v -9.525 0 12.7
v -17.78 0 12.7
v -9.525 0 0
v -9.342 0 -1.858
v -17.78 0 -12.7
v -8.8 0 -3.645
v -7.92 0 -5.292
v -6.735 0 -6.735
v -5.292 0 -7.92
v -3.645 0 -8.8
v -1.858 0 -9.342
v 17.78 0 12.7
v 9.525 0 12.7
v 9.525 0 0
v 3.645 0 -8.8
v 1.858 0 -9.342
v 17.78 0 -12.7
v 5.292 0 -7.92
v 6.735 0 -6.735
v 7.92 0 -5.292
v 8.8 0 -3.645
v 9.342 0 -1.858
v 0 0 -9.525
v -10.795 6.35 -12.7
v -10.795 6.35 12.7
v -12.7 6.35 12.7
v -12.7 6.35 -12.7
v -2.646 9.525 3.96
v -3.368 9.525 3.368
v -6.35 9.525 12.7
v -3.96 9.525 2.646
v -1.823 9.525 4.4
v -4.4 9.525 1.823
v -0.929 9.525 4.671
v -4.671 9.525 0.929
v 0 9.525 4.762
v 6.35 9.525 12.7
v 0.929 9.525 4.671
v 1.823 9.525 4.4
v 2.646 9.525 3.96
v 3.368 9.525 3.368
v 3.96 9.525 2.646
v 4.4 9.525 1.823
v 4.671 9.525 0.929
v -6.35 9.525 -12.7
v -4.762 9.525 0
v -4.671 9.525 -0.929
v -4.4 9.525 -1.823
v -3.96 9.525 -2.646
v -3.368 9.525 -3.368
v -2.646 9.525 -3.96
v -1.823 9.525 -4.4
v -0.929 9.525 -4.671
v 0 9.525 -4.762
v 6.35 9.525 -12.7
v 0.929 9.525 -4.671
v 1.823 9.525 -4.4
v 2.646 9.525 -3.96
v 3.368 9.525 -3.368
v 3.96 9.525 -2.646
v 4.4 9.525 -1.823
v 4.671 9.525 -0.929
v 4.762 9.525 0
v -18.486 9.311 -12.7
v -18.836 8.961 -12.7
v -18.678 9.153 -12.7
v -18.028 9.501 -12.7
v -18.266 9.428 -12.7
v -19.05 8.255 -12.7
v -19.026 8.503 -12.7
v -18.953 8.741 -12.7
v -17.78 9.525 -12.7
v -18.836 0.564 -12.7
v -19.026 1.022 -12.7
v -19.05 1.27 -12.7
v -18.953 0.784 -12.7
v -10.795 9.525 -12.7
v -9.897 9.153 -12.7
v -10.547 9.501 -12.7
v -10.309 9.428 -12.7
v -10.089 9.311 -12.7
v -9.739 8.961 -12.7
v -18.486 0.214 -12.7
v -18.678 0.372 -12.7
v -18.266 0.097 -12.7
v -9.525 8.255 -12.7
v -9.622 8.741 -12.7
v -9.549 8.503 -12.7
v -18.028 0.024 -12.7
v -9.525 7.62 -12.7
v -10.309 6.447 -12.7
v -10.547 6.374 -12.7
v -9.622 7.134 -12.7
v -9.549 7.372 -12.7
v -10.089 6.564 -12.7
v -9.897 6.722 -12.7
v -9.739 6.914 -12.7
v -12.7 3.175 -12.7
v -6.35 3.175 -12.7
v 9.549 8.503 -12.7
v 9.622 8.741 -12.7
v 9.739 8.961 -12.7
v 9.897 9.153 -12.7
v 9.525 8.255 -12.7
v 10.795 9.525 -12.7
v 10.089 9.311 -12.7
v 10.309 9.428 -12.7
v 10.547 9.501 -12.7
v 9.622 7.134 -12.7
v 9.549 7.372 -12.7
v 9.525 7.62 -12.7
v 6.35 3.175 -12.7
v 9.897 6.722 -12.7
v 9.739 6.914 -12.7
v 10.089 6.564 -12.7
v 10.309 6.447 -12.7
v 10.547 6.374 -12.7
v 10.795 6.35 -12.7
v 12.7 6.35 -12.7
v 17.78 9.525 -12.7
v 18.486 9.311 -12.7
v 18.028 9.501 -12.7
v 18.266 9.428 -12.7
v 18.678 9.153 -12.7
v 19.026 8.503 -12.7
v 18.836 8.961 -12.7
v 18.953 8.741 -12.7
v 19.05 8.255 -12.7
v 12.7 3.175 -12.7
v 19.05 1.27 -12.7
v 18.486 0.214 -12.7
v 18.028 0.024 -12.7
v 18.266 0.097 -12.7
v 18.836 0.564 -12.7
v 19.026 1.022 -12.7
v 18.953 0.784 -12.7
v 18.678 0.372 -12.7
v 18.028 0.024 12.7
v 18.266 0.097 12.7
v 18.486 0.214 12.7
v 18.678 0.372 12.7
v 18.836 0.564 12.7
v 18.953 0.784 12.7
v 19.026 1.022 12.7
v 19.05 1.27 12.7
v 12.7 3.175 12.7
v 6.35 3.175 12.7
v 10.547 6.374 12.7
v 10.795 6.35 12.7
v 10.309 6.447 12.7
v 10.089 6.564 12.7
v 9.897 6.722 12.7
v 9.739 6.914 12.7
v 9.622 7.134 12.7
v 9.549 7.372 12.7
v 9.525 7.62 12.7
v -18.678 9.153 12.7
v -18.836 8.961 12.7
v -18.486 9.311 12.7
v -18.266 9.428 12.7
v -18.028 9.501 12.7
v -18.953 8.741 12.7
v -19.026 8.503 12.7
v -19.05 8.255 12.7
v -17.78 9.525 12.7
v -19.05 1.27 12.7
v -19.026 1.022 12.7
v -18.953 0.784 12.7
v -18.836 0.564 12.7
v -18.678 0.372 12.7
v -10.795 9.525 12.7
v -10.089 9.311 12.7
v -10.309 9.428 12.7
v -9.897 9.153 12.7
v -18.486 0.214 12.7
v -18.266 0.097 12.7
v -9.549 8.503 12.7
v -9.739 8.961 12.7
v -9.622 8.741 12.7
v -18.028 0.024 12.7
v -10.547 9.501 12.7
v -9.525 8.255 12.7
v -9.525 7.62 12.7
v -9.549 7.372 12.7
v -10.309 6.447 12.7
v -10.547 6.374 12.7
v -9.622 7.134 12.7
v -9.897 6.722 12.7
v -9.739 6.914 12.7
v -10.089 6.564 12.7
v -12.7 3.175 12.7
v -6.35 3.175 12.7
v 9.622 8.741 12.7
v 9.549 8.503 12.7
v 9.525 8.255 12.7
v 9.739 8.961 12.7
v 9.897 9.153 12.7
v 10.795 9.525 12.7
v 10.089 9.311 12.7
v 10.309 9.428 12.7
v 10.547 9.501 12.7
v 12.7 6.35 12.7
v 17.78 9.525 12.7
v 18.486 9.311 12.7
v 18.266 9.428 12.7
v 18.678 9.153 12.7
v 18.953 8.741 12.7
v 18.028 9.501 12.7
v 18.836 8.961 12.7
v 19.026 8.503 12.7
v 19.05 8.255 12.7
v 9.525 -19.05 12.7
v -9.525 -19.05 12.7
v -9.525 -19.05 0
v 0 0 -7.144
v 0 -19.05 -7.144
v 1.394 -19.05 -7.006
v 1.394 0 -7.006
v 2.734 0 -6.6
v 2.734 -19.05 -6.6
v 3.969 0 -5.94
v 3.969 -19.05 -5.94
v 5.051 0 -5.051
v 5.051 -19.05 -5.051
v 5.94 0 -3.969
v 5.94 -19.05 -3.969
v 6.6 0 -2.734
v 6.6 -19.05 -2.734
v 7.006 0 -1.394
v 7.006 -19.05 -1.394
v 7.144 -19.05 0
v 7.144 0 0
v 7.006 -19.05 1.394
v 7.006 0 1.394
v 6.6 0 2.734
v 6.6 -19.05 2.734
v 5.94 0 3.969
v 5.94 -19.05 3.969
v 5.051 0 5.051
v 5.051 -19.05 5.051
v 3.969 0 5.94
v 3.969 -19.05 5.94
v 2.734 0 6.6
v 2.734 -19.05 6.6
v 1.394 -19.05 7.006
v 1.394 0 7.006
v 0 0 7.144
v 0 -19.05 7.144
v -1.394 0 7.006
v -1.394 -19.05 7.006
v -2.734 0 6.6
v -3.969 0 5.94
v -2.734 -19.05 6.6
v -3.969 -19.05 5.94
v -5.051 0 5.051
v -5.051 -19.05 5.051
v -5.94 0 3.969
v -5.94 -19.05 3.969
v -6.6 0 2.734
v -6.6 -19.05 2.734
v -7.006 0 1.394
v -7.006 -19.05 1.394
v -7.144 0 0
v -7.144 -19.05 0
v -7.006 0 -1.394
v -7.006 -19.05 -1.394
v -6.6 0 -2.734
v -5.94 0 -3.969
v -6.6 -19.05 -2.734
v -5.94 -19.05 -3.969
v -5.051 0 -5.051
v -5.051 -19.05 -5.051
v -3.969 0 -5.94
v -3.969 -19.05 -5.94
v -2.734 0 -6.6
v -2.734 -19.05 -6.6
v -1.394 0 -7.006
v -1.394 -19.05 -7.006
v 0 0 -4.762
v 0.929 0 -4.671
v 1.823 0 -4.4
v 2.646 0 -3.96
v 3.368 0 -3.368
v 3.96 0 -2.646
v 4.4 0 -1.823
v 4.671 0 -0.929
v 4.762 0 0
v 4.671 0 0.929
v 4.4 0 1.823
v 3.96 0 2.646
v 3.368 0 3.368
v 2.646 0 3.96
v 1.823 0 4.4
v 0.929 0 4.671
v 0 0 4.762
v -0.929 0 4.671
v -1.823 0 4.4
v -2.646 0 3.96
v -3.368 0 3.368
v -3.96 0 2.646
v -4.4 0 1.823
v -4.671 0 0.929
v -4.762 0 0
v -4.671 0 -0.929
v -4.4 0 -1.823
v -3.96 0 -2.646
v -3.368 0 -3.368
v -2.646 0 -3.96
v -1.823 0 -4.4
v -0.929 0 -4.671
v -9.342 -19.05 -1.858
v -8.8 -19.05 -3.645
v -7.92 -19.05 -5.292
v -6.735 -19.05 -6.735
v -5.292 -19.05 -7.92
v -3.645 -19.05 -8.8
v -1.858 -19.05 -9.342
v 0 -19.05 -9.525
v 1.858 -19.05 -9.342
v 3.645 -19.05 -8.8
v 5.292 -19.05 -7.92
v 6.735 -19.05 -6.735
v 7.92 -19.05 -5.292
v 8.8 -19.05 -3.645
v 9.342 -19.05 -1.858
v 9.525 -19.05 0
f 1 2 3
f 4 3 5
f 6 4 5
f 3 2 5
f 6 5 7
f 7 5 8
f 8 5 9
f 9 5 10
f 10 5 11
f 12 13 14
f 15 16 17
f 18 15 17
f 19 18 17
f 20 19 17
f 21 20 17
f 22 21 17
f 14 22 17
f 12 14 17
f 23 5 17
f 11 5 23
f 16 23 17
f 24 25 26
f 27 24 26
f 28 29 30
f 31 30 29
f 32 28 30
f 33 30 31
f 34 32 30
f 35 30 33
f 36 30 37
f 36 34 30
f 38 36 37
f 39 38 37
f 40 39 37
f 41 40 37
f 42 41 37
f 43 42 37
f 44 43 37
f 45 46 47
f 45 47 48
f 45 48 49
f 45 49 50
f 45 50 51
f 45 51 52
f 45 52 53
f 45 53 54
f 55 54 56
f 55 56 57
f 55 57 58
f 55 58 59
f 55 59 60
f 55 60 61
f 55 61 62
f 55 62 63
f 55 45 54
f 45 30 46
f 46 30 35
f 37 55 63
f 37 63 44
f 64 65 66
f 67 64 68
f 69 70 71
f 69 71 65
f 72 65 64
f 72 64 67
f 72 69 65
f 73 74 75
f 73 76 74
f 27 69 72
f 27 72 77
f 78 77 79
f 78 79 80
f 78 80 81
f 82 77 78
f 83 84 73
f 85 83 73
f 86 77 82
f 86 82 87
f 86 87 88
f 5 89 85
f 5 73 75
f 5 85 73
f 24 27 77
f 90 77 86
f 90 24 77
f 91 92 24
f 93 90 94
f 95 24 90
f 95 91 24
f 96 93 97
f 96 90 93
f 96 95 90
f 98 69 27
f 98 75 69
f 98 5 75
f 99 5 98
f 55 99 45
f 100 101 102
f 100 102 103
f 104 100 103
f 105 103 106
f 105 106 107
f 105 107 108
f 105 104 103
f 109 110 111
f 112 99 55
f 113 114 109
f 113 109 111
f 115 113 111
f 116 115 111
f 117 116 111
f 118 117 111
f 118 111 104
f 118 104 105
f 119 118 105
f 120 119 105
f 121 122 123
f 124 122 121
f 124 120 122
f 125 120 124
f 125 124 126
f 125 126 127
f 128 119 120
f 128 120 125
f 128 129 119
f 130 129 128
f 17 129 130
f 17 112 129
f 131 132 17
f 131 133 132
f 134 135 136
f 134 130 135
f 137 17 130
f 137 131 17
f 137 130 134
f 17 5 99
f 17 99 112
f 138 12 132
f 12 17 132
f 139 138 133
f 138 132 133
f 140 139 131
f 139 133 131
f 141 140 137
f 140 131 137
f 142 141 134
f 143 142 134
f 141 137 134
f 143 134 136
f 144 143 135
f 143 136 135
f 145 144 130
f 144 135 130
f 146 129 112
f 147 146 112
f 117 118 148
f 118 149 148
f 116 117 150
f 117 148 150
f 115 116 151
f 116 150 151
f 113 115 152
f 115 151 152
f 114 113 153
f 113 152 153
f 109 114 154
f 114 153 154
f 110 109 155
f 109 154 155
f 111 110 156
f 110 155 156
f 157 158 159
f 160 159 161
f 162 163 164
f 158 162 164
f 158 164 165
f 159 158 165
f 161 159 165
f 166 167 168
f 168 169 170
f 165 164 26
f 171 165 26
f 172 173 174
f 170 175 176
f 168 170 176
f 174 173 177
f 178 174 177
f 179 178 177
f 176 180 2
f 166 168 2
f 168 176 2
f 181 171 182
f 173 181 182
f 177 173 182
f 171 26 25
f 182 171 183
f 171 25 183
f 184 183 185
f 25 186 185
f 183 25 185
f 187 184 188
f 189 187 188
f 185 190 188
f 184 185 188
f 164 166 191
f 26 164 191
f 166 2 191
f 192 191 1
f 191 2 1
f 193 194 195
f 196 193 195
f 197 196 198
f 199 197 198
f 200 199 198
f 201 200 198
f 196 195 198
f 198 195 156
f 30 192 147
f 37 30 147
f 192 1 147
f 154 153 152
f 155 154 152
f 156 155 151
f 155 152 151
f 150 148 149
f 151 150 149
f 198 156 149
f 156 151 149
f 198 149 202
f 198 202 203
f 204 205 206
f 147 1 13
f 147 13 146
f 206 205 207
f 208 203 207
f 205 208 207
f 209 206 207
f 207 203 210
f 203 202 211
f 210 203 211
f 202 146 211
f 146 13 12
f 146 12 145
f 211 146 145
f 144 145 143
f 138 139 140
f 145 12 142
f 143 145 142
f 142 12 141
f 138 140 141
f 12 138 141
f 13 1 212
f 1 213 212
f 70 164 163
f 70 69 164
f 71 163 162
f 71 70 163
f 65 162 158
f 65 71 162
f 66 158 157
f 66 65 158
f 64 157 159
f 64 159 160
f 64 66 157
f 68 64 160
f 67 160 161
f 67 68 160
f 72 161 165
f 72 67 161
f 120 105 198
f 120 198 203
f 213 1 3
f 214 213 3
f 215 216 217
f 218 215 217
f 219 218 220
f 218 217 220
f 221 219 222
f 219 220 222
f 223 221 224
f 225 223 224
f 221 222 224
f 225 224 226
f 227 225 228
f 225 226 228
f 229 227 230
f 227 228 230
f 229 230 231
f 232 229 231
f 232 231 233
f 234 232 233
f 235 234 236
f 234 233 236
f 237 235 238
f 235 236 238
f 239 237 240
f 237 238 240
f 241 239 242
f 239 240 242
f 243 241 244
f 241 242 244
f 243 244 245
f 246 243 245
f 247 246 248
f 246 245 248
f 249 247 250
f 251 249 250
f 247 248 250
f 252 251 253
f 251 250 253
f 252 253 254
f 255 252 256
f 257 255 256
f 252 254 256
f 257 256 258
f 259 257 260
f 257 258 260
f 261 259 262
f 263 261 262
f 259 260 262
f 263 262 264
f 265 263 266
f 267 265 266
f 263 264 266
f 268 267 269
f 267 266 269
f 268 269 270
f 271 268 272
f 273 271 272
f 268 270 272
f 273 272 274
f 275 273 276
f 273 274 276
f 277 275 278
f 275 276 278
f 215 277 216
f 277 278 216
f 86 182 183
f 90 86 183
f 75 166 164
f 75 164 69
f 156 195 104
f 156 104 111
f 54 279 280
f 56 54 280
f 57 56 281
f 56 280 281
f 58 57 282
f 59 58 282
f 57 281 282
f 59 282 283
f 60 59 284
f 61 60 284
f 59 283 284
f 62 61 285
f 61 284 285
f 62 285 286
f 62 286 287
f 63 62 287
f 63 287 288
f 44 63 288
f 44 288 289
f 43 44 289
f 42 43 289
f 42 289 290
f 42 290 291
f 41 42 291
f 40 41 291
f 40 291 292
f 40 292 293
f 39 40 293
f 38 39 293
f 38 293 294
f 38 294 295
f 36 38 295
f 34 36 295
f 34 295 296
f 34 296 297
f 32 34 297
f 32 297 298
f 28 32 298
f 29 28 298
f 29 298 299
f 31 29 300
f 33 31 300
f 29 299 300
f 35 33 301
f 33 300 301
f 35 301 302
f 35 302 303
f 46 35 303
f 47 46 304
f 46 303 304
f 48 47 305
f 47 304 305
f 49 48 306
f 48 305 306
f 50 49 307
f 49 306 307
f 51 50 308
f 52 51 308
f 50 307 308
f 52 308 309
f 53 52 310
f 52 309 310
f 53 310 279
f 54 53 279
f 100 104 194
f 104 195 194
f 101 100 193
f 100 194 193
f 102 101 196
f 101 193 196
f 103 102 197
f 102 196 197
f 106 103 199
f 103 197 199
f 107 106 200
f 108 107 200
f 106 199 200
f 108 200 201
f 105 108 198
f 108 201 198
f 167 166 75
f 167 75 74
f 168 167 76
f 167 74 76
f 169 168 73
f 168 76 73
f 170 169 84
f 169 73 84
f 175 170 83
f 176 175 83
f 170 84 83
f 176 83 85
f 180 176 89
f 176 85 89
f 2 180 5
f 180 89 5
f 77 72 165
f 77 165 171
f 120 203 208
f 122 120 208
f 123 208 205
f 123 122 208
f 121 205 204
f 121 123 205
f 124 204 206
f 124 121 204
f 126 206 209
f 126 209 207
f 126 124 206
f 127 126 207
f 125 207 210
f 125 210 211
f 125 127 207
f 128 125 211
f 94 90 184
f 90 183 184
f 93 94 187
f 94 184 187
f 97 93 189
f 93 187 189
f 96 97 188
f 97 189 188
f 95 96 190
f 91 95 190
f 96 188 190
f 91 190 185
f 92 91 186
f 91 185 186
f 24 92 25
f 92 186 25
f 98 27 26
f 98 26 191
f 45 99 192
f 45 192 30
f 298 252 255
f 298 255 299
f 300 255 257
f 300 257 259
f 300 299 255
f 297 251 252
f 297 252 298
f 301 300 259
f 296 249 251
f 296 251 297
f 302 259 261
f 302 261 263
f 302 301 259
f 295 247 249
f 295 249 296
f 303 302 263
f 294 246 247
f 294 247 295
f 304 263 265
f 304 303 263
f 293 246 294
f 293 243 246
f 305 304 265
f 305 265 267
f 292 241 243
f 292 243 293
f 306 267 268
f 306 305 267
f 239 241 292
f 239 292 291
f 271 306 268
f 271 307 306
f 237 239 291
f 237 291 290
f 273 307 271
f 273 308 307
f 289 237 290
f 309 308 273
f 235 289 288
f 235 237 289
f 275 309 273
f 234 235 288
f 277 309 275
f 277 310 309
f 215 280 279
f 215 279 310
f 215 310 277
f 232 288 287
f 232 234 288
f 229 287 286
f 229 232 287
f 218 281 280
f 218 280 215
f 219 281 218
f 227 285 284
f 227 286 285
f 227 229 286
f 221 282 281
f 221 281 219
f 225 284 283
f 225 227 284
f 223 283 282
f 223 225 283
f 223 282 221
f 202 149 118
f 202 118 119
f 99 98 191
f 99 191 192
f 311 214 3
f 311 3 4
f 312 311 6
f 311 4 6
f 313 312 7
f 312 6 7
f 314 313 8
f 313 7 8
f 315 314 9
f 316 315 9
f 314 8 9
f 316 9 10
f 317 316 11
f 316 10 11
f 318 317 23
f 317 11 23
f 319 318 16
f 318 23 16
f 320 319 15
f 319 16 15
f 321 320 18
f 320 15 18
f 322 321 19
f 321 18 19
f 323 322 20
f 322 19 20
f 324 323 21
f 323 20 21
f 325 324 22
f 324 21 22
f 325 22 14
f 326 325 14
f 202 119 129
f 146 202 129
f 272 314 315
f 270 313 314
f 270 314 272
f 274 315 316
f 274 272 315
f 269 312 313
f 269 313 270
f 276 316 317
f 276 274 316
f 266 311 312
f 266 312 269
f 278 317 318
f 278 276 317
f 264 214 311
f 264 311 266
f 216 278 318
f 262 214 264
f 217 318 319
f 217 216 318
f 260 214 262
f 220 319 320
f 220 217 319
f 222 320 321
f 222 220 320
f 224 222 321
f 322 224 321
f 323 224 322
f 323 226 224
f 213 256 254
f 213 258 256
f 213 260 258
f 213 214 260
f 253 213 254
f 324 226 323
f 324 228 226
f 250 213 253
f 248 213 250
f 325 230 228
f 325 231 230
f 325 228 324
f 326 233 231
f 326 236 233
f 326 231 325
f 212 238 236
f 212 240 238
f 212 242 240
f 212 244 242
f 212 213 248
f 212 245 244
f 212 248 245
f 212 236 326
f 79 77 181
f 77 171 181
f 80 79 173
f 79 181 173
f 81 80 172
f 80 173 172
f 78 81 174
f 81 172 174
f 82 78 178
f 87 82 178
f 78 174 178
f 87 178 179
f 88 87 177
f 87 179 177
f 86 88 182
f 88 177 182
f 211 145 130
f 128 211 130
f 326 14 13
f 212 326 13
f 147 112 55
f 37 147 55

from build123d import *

# Parameters (mm, degrees)
SKETCH1_W           = 38.1
SKETCH1_H           = 25.4
BOSS_EXTRUDE1_DEPTH = 9.525
CUT_EXTRUDE1_REACH  = 35.148
BOSS_EXTRUDE2_DEPTH = 19.05
CUT_EXTRUDE3_REACH  = 38.616
SKETCH5_R           = 4.7625
SKETCH4_R           = 7.14375
CUT_EXTRUDE2_DEPTH  = 19.05
FILLET2_R           = 1.27


with BuildPart() as part:
    # Sketch1 → Boss-Extrude1 (new body)
    with BuildSketch(Plane(origin=(0, 0, 0), x_dir=(1, 0, 0), z_dir=(0, 1, 0))):
        Rectangle(SKETCH1_W, SKETCH1_H)
    extrude(amount=BOSS_EXTRUDE1_DEPTH)

    # Sketch2 → Cut-Extrude1 (cut, up to next)
    with BuildSketch(Plane(origin=(0, 0, -12.7), x_dir=(-1, 0, 0), z_dir=(0, 0, -1)), mode=Mode.PRIVATE) as cut_extrude1_sk1:
        Polygon((-9.525, 9.525), (-9.525, 6.35), (-12.7, 6.35), (-12.7, 3.175), (-6.35, 3.175), (-6.35, 9.525), align=None)
    cut_extrude1_tool1 = extrude(cut_extrude1_sk1.sketch, amount=-CUT_EXTRUDE1_REACH, mode=Mode.PRIVATE) & part.part
    cut_extrude1 = cut_extrude1_tool1.solids().sort_by_distance((8.995833, 5.820833, -12.7))[0]
    add(cut_extrude1, mode=Mode.SUBTRACT)

    # Mirror1: Cut-Extrude1 across plane
    add(cut_extrude1.mirror(Plane(origin=(0, 0, 0), x_dir=(0, 0, 1), z_dir=(1, 0, 0))), mode=Mode.SUBTRACT)

    # Sketch3 → Boss-Extrude2 (add)
    with BuildSketch(Plane.XZ):
        with BuildLine():
            Line((9.525, 0), (9.525, 12.7))
            Line((9.525, 12.7), (-9.525, 12.7))
            Line((-9.525, 12.7), (-9.525, 0))
            ThreePointArc((-9.525, 0), (0, -9.525), (9.525, 0))
        make_face()
    extrude(amount=BOSS_EXTRUDE2_DEPTH)

    # Sketch5 → Cut-Extrude3 (cut, up to next)
    with BuildSketch(Plane(origin=(0, -19.05, 0), x_dir=(-1, 0, 0), z_dir=(0, -1, 0)), mode=Mode.PRIVATE) as cut_extrude3_sk1:
        with Locations(Location((0, 0, 0), (0, 0, 90))):
            Circle(SKETCH5_R)
    cut_extrude3_tool1 = extrude(cut_extrude3_sk1.sketch, amount=-CUT_EXTRUDE3_REACH, mode=Mode.PRIVATE) & part.part
    add(cut_extrude3_tool1.solids().sort_by_distance((0, -19.05, 0))[0], mode=Mode.SUBTRACT)

    # Sketch4 → Cut-Extrude2 (cut)
    with BuildSketch(Plane.XZ.offset(19.05)):
        with Locations(Location((0, 0, 0), (0, 0, 270))):
            Circle(SKETCH4_R)
    extrude(amount=-CUT_EXTRUDE2_DEPTH, mode=Mode.SUBTRACT)

    # Fillet2
    fillet2_edges = [part.edges().sort_by_distance(p)[0] for p in [
        (19.05, 0, 0),
        (-19.05, 0, 0),
        (-19.05, 9.525, 0),
        (19.05, 9.525, 0),
        (9.525, 6.35, 0),
        (9.525, 9.525, 0),
        (-9.525, 6.35, 0),
        (-9.525, 9.525, 0),
    ]]
    fillet(fillet2_edges, radius=FILLET2_R)


solid = part.part
